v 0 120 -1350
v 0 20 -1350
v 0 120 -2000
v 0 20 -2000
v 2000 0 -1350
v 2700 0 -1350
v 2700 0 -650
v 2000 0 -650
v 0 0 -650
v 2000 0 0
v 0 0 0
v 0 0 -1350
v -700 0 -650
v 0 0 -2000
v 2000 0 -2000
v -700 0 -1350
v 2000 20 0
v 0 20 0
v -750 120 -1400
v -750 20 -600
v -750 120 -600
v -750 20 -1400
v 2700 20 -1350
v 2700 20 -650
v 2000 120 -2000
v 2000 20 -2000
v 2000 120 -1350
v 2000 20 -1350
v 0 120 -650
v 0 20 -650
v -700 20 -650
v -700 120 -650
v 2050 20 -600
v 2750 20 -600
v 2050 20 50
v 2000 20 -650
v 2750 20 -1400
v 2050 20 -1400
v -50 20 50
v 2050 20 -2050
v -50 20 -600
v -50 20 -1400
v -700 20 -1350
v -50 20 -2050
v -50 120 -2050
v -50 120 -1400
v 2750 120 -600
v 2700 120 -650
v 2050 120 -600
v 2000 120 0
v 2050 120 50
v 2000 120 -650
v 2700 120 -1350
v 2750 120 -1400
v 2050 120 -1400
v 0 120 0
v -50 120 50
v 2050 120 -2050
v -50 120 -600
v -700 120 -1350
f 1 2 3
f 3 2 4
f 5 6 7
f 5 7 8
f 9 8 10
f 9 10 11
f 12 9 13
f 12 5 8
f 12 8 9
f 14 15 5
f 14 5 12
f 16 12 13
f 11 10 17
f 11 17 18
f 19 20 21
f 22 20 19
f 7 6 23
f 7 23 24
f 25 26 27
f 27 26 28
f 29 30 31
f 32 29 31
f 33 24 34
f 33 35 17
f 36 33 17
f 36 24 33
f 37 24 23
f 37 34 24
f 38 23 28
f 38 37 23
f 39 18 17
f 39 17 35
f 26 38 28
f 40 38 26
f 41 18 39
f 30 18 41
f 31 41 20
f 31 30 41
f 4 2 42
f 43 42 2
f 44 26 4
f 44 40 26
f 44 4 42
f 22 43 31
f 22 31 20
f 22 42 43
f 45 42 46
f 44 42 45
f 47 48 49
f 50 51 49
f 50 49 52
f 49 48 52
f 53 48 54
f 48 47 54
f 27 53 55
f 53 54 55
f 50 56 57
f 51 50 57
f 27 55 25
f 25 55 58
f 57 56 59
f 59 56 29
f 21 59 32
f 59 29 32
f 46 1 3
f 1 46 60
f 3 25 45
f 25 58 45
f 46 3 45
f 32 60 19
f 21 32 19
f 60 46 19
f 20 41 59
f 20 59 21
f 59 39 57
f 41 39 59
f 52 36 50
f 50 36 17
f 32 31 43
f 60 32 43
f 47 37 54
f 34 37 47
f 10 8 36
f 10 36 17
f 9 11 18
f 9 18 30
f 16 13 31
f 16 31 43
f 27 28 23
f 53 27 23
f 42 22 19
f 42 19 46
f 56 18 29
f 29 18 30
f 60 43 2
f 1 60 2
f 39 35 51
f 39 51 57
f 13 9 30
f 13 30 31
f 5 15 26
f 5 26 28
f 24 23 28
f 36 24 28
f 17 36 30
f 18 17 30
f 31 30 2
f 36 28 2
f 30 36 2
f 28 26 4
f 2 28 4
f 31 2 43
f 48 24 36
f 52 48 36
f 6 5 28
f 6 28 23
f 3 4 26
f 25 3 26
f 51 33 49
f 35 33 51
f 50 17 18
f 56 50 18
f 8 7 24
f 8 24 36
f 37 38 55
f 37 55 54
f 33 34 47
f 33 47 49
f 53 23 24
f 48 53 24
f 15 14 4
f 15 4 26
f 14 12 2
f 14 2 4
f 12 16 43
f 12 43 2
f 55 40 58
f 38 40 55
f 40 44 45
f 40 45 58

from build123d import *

# Parameters (mm, degrees)
SALIENTE_EXTRUIR1_DEPTH = 20
SALIENTE_EXTRUIR2_DEPTH = 100


with BuildPart() as part:
    # Croquis1 → Saliente-Extruir1 (new body)
    with BuildSketch(Plane(origin=(0, 0, 0), x_dir=(1, 0, 0), z_dir=(0, 1, 0))):
        Polygon((0, 1350), (0, 2000), (2000, 2000), (2000, 1350), (2700, 1350), (2700, 650), (2000, 650), (2000, 0), (0, 0), (0, 650), (-700, 650), (-700, 1350), align=None)
    extrude(amount=SALIENTE_EXTRUIR1_DEPTH)


with BuildPart() as body_2:
    # Croquis2 → Saliente-Extruir2 (new body)
    with BuildSketch(Plane(origin=(0, 20, 0), x_dir=(1, 0, 0), z_dir=(0, 1, 0))):
        Polygon((-750, 600), (-750, 1400), (-50, 1400), (-50, 2050), (2050, 2050), (2050, 1400), (2750, 1400), (2750, 600), (2050, 600), (2050, -50), (-50, -50), (-50, 600), align=None)
        Polygon((-700, 1350), (0, 1350), (0, 2000), (2000, 2000), (2000, 1350), (2700, 1350), (2700, 650), (2000, 650), (2000, 0), (0, 0), (0, 650), (-700, 650), align=None, mode=Mode.SUBTRACT)
    extrude(amount=SALIENTE_EXTRUIR2_DEPTH)


solid = Compound([part.part, body_2.part])
